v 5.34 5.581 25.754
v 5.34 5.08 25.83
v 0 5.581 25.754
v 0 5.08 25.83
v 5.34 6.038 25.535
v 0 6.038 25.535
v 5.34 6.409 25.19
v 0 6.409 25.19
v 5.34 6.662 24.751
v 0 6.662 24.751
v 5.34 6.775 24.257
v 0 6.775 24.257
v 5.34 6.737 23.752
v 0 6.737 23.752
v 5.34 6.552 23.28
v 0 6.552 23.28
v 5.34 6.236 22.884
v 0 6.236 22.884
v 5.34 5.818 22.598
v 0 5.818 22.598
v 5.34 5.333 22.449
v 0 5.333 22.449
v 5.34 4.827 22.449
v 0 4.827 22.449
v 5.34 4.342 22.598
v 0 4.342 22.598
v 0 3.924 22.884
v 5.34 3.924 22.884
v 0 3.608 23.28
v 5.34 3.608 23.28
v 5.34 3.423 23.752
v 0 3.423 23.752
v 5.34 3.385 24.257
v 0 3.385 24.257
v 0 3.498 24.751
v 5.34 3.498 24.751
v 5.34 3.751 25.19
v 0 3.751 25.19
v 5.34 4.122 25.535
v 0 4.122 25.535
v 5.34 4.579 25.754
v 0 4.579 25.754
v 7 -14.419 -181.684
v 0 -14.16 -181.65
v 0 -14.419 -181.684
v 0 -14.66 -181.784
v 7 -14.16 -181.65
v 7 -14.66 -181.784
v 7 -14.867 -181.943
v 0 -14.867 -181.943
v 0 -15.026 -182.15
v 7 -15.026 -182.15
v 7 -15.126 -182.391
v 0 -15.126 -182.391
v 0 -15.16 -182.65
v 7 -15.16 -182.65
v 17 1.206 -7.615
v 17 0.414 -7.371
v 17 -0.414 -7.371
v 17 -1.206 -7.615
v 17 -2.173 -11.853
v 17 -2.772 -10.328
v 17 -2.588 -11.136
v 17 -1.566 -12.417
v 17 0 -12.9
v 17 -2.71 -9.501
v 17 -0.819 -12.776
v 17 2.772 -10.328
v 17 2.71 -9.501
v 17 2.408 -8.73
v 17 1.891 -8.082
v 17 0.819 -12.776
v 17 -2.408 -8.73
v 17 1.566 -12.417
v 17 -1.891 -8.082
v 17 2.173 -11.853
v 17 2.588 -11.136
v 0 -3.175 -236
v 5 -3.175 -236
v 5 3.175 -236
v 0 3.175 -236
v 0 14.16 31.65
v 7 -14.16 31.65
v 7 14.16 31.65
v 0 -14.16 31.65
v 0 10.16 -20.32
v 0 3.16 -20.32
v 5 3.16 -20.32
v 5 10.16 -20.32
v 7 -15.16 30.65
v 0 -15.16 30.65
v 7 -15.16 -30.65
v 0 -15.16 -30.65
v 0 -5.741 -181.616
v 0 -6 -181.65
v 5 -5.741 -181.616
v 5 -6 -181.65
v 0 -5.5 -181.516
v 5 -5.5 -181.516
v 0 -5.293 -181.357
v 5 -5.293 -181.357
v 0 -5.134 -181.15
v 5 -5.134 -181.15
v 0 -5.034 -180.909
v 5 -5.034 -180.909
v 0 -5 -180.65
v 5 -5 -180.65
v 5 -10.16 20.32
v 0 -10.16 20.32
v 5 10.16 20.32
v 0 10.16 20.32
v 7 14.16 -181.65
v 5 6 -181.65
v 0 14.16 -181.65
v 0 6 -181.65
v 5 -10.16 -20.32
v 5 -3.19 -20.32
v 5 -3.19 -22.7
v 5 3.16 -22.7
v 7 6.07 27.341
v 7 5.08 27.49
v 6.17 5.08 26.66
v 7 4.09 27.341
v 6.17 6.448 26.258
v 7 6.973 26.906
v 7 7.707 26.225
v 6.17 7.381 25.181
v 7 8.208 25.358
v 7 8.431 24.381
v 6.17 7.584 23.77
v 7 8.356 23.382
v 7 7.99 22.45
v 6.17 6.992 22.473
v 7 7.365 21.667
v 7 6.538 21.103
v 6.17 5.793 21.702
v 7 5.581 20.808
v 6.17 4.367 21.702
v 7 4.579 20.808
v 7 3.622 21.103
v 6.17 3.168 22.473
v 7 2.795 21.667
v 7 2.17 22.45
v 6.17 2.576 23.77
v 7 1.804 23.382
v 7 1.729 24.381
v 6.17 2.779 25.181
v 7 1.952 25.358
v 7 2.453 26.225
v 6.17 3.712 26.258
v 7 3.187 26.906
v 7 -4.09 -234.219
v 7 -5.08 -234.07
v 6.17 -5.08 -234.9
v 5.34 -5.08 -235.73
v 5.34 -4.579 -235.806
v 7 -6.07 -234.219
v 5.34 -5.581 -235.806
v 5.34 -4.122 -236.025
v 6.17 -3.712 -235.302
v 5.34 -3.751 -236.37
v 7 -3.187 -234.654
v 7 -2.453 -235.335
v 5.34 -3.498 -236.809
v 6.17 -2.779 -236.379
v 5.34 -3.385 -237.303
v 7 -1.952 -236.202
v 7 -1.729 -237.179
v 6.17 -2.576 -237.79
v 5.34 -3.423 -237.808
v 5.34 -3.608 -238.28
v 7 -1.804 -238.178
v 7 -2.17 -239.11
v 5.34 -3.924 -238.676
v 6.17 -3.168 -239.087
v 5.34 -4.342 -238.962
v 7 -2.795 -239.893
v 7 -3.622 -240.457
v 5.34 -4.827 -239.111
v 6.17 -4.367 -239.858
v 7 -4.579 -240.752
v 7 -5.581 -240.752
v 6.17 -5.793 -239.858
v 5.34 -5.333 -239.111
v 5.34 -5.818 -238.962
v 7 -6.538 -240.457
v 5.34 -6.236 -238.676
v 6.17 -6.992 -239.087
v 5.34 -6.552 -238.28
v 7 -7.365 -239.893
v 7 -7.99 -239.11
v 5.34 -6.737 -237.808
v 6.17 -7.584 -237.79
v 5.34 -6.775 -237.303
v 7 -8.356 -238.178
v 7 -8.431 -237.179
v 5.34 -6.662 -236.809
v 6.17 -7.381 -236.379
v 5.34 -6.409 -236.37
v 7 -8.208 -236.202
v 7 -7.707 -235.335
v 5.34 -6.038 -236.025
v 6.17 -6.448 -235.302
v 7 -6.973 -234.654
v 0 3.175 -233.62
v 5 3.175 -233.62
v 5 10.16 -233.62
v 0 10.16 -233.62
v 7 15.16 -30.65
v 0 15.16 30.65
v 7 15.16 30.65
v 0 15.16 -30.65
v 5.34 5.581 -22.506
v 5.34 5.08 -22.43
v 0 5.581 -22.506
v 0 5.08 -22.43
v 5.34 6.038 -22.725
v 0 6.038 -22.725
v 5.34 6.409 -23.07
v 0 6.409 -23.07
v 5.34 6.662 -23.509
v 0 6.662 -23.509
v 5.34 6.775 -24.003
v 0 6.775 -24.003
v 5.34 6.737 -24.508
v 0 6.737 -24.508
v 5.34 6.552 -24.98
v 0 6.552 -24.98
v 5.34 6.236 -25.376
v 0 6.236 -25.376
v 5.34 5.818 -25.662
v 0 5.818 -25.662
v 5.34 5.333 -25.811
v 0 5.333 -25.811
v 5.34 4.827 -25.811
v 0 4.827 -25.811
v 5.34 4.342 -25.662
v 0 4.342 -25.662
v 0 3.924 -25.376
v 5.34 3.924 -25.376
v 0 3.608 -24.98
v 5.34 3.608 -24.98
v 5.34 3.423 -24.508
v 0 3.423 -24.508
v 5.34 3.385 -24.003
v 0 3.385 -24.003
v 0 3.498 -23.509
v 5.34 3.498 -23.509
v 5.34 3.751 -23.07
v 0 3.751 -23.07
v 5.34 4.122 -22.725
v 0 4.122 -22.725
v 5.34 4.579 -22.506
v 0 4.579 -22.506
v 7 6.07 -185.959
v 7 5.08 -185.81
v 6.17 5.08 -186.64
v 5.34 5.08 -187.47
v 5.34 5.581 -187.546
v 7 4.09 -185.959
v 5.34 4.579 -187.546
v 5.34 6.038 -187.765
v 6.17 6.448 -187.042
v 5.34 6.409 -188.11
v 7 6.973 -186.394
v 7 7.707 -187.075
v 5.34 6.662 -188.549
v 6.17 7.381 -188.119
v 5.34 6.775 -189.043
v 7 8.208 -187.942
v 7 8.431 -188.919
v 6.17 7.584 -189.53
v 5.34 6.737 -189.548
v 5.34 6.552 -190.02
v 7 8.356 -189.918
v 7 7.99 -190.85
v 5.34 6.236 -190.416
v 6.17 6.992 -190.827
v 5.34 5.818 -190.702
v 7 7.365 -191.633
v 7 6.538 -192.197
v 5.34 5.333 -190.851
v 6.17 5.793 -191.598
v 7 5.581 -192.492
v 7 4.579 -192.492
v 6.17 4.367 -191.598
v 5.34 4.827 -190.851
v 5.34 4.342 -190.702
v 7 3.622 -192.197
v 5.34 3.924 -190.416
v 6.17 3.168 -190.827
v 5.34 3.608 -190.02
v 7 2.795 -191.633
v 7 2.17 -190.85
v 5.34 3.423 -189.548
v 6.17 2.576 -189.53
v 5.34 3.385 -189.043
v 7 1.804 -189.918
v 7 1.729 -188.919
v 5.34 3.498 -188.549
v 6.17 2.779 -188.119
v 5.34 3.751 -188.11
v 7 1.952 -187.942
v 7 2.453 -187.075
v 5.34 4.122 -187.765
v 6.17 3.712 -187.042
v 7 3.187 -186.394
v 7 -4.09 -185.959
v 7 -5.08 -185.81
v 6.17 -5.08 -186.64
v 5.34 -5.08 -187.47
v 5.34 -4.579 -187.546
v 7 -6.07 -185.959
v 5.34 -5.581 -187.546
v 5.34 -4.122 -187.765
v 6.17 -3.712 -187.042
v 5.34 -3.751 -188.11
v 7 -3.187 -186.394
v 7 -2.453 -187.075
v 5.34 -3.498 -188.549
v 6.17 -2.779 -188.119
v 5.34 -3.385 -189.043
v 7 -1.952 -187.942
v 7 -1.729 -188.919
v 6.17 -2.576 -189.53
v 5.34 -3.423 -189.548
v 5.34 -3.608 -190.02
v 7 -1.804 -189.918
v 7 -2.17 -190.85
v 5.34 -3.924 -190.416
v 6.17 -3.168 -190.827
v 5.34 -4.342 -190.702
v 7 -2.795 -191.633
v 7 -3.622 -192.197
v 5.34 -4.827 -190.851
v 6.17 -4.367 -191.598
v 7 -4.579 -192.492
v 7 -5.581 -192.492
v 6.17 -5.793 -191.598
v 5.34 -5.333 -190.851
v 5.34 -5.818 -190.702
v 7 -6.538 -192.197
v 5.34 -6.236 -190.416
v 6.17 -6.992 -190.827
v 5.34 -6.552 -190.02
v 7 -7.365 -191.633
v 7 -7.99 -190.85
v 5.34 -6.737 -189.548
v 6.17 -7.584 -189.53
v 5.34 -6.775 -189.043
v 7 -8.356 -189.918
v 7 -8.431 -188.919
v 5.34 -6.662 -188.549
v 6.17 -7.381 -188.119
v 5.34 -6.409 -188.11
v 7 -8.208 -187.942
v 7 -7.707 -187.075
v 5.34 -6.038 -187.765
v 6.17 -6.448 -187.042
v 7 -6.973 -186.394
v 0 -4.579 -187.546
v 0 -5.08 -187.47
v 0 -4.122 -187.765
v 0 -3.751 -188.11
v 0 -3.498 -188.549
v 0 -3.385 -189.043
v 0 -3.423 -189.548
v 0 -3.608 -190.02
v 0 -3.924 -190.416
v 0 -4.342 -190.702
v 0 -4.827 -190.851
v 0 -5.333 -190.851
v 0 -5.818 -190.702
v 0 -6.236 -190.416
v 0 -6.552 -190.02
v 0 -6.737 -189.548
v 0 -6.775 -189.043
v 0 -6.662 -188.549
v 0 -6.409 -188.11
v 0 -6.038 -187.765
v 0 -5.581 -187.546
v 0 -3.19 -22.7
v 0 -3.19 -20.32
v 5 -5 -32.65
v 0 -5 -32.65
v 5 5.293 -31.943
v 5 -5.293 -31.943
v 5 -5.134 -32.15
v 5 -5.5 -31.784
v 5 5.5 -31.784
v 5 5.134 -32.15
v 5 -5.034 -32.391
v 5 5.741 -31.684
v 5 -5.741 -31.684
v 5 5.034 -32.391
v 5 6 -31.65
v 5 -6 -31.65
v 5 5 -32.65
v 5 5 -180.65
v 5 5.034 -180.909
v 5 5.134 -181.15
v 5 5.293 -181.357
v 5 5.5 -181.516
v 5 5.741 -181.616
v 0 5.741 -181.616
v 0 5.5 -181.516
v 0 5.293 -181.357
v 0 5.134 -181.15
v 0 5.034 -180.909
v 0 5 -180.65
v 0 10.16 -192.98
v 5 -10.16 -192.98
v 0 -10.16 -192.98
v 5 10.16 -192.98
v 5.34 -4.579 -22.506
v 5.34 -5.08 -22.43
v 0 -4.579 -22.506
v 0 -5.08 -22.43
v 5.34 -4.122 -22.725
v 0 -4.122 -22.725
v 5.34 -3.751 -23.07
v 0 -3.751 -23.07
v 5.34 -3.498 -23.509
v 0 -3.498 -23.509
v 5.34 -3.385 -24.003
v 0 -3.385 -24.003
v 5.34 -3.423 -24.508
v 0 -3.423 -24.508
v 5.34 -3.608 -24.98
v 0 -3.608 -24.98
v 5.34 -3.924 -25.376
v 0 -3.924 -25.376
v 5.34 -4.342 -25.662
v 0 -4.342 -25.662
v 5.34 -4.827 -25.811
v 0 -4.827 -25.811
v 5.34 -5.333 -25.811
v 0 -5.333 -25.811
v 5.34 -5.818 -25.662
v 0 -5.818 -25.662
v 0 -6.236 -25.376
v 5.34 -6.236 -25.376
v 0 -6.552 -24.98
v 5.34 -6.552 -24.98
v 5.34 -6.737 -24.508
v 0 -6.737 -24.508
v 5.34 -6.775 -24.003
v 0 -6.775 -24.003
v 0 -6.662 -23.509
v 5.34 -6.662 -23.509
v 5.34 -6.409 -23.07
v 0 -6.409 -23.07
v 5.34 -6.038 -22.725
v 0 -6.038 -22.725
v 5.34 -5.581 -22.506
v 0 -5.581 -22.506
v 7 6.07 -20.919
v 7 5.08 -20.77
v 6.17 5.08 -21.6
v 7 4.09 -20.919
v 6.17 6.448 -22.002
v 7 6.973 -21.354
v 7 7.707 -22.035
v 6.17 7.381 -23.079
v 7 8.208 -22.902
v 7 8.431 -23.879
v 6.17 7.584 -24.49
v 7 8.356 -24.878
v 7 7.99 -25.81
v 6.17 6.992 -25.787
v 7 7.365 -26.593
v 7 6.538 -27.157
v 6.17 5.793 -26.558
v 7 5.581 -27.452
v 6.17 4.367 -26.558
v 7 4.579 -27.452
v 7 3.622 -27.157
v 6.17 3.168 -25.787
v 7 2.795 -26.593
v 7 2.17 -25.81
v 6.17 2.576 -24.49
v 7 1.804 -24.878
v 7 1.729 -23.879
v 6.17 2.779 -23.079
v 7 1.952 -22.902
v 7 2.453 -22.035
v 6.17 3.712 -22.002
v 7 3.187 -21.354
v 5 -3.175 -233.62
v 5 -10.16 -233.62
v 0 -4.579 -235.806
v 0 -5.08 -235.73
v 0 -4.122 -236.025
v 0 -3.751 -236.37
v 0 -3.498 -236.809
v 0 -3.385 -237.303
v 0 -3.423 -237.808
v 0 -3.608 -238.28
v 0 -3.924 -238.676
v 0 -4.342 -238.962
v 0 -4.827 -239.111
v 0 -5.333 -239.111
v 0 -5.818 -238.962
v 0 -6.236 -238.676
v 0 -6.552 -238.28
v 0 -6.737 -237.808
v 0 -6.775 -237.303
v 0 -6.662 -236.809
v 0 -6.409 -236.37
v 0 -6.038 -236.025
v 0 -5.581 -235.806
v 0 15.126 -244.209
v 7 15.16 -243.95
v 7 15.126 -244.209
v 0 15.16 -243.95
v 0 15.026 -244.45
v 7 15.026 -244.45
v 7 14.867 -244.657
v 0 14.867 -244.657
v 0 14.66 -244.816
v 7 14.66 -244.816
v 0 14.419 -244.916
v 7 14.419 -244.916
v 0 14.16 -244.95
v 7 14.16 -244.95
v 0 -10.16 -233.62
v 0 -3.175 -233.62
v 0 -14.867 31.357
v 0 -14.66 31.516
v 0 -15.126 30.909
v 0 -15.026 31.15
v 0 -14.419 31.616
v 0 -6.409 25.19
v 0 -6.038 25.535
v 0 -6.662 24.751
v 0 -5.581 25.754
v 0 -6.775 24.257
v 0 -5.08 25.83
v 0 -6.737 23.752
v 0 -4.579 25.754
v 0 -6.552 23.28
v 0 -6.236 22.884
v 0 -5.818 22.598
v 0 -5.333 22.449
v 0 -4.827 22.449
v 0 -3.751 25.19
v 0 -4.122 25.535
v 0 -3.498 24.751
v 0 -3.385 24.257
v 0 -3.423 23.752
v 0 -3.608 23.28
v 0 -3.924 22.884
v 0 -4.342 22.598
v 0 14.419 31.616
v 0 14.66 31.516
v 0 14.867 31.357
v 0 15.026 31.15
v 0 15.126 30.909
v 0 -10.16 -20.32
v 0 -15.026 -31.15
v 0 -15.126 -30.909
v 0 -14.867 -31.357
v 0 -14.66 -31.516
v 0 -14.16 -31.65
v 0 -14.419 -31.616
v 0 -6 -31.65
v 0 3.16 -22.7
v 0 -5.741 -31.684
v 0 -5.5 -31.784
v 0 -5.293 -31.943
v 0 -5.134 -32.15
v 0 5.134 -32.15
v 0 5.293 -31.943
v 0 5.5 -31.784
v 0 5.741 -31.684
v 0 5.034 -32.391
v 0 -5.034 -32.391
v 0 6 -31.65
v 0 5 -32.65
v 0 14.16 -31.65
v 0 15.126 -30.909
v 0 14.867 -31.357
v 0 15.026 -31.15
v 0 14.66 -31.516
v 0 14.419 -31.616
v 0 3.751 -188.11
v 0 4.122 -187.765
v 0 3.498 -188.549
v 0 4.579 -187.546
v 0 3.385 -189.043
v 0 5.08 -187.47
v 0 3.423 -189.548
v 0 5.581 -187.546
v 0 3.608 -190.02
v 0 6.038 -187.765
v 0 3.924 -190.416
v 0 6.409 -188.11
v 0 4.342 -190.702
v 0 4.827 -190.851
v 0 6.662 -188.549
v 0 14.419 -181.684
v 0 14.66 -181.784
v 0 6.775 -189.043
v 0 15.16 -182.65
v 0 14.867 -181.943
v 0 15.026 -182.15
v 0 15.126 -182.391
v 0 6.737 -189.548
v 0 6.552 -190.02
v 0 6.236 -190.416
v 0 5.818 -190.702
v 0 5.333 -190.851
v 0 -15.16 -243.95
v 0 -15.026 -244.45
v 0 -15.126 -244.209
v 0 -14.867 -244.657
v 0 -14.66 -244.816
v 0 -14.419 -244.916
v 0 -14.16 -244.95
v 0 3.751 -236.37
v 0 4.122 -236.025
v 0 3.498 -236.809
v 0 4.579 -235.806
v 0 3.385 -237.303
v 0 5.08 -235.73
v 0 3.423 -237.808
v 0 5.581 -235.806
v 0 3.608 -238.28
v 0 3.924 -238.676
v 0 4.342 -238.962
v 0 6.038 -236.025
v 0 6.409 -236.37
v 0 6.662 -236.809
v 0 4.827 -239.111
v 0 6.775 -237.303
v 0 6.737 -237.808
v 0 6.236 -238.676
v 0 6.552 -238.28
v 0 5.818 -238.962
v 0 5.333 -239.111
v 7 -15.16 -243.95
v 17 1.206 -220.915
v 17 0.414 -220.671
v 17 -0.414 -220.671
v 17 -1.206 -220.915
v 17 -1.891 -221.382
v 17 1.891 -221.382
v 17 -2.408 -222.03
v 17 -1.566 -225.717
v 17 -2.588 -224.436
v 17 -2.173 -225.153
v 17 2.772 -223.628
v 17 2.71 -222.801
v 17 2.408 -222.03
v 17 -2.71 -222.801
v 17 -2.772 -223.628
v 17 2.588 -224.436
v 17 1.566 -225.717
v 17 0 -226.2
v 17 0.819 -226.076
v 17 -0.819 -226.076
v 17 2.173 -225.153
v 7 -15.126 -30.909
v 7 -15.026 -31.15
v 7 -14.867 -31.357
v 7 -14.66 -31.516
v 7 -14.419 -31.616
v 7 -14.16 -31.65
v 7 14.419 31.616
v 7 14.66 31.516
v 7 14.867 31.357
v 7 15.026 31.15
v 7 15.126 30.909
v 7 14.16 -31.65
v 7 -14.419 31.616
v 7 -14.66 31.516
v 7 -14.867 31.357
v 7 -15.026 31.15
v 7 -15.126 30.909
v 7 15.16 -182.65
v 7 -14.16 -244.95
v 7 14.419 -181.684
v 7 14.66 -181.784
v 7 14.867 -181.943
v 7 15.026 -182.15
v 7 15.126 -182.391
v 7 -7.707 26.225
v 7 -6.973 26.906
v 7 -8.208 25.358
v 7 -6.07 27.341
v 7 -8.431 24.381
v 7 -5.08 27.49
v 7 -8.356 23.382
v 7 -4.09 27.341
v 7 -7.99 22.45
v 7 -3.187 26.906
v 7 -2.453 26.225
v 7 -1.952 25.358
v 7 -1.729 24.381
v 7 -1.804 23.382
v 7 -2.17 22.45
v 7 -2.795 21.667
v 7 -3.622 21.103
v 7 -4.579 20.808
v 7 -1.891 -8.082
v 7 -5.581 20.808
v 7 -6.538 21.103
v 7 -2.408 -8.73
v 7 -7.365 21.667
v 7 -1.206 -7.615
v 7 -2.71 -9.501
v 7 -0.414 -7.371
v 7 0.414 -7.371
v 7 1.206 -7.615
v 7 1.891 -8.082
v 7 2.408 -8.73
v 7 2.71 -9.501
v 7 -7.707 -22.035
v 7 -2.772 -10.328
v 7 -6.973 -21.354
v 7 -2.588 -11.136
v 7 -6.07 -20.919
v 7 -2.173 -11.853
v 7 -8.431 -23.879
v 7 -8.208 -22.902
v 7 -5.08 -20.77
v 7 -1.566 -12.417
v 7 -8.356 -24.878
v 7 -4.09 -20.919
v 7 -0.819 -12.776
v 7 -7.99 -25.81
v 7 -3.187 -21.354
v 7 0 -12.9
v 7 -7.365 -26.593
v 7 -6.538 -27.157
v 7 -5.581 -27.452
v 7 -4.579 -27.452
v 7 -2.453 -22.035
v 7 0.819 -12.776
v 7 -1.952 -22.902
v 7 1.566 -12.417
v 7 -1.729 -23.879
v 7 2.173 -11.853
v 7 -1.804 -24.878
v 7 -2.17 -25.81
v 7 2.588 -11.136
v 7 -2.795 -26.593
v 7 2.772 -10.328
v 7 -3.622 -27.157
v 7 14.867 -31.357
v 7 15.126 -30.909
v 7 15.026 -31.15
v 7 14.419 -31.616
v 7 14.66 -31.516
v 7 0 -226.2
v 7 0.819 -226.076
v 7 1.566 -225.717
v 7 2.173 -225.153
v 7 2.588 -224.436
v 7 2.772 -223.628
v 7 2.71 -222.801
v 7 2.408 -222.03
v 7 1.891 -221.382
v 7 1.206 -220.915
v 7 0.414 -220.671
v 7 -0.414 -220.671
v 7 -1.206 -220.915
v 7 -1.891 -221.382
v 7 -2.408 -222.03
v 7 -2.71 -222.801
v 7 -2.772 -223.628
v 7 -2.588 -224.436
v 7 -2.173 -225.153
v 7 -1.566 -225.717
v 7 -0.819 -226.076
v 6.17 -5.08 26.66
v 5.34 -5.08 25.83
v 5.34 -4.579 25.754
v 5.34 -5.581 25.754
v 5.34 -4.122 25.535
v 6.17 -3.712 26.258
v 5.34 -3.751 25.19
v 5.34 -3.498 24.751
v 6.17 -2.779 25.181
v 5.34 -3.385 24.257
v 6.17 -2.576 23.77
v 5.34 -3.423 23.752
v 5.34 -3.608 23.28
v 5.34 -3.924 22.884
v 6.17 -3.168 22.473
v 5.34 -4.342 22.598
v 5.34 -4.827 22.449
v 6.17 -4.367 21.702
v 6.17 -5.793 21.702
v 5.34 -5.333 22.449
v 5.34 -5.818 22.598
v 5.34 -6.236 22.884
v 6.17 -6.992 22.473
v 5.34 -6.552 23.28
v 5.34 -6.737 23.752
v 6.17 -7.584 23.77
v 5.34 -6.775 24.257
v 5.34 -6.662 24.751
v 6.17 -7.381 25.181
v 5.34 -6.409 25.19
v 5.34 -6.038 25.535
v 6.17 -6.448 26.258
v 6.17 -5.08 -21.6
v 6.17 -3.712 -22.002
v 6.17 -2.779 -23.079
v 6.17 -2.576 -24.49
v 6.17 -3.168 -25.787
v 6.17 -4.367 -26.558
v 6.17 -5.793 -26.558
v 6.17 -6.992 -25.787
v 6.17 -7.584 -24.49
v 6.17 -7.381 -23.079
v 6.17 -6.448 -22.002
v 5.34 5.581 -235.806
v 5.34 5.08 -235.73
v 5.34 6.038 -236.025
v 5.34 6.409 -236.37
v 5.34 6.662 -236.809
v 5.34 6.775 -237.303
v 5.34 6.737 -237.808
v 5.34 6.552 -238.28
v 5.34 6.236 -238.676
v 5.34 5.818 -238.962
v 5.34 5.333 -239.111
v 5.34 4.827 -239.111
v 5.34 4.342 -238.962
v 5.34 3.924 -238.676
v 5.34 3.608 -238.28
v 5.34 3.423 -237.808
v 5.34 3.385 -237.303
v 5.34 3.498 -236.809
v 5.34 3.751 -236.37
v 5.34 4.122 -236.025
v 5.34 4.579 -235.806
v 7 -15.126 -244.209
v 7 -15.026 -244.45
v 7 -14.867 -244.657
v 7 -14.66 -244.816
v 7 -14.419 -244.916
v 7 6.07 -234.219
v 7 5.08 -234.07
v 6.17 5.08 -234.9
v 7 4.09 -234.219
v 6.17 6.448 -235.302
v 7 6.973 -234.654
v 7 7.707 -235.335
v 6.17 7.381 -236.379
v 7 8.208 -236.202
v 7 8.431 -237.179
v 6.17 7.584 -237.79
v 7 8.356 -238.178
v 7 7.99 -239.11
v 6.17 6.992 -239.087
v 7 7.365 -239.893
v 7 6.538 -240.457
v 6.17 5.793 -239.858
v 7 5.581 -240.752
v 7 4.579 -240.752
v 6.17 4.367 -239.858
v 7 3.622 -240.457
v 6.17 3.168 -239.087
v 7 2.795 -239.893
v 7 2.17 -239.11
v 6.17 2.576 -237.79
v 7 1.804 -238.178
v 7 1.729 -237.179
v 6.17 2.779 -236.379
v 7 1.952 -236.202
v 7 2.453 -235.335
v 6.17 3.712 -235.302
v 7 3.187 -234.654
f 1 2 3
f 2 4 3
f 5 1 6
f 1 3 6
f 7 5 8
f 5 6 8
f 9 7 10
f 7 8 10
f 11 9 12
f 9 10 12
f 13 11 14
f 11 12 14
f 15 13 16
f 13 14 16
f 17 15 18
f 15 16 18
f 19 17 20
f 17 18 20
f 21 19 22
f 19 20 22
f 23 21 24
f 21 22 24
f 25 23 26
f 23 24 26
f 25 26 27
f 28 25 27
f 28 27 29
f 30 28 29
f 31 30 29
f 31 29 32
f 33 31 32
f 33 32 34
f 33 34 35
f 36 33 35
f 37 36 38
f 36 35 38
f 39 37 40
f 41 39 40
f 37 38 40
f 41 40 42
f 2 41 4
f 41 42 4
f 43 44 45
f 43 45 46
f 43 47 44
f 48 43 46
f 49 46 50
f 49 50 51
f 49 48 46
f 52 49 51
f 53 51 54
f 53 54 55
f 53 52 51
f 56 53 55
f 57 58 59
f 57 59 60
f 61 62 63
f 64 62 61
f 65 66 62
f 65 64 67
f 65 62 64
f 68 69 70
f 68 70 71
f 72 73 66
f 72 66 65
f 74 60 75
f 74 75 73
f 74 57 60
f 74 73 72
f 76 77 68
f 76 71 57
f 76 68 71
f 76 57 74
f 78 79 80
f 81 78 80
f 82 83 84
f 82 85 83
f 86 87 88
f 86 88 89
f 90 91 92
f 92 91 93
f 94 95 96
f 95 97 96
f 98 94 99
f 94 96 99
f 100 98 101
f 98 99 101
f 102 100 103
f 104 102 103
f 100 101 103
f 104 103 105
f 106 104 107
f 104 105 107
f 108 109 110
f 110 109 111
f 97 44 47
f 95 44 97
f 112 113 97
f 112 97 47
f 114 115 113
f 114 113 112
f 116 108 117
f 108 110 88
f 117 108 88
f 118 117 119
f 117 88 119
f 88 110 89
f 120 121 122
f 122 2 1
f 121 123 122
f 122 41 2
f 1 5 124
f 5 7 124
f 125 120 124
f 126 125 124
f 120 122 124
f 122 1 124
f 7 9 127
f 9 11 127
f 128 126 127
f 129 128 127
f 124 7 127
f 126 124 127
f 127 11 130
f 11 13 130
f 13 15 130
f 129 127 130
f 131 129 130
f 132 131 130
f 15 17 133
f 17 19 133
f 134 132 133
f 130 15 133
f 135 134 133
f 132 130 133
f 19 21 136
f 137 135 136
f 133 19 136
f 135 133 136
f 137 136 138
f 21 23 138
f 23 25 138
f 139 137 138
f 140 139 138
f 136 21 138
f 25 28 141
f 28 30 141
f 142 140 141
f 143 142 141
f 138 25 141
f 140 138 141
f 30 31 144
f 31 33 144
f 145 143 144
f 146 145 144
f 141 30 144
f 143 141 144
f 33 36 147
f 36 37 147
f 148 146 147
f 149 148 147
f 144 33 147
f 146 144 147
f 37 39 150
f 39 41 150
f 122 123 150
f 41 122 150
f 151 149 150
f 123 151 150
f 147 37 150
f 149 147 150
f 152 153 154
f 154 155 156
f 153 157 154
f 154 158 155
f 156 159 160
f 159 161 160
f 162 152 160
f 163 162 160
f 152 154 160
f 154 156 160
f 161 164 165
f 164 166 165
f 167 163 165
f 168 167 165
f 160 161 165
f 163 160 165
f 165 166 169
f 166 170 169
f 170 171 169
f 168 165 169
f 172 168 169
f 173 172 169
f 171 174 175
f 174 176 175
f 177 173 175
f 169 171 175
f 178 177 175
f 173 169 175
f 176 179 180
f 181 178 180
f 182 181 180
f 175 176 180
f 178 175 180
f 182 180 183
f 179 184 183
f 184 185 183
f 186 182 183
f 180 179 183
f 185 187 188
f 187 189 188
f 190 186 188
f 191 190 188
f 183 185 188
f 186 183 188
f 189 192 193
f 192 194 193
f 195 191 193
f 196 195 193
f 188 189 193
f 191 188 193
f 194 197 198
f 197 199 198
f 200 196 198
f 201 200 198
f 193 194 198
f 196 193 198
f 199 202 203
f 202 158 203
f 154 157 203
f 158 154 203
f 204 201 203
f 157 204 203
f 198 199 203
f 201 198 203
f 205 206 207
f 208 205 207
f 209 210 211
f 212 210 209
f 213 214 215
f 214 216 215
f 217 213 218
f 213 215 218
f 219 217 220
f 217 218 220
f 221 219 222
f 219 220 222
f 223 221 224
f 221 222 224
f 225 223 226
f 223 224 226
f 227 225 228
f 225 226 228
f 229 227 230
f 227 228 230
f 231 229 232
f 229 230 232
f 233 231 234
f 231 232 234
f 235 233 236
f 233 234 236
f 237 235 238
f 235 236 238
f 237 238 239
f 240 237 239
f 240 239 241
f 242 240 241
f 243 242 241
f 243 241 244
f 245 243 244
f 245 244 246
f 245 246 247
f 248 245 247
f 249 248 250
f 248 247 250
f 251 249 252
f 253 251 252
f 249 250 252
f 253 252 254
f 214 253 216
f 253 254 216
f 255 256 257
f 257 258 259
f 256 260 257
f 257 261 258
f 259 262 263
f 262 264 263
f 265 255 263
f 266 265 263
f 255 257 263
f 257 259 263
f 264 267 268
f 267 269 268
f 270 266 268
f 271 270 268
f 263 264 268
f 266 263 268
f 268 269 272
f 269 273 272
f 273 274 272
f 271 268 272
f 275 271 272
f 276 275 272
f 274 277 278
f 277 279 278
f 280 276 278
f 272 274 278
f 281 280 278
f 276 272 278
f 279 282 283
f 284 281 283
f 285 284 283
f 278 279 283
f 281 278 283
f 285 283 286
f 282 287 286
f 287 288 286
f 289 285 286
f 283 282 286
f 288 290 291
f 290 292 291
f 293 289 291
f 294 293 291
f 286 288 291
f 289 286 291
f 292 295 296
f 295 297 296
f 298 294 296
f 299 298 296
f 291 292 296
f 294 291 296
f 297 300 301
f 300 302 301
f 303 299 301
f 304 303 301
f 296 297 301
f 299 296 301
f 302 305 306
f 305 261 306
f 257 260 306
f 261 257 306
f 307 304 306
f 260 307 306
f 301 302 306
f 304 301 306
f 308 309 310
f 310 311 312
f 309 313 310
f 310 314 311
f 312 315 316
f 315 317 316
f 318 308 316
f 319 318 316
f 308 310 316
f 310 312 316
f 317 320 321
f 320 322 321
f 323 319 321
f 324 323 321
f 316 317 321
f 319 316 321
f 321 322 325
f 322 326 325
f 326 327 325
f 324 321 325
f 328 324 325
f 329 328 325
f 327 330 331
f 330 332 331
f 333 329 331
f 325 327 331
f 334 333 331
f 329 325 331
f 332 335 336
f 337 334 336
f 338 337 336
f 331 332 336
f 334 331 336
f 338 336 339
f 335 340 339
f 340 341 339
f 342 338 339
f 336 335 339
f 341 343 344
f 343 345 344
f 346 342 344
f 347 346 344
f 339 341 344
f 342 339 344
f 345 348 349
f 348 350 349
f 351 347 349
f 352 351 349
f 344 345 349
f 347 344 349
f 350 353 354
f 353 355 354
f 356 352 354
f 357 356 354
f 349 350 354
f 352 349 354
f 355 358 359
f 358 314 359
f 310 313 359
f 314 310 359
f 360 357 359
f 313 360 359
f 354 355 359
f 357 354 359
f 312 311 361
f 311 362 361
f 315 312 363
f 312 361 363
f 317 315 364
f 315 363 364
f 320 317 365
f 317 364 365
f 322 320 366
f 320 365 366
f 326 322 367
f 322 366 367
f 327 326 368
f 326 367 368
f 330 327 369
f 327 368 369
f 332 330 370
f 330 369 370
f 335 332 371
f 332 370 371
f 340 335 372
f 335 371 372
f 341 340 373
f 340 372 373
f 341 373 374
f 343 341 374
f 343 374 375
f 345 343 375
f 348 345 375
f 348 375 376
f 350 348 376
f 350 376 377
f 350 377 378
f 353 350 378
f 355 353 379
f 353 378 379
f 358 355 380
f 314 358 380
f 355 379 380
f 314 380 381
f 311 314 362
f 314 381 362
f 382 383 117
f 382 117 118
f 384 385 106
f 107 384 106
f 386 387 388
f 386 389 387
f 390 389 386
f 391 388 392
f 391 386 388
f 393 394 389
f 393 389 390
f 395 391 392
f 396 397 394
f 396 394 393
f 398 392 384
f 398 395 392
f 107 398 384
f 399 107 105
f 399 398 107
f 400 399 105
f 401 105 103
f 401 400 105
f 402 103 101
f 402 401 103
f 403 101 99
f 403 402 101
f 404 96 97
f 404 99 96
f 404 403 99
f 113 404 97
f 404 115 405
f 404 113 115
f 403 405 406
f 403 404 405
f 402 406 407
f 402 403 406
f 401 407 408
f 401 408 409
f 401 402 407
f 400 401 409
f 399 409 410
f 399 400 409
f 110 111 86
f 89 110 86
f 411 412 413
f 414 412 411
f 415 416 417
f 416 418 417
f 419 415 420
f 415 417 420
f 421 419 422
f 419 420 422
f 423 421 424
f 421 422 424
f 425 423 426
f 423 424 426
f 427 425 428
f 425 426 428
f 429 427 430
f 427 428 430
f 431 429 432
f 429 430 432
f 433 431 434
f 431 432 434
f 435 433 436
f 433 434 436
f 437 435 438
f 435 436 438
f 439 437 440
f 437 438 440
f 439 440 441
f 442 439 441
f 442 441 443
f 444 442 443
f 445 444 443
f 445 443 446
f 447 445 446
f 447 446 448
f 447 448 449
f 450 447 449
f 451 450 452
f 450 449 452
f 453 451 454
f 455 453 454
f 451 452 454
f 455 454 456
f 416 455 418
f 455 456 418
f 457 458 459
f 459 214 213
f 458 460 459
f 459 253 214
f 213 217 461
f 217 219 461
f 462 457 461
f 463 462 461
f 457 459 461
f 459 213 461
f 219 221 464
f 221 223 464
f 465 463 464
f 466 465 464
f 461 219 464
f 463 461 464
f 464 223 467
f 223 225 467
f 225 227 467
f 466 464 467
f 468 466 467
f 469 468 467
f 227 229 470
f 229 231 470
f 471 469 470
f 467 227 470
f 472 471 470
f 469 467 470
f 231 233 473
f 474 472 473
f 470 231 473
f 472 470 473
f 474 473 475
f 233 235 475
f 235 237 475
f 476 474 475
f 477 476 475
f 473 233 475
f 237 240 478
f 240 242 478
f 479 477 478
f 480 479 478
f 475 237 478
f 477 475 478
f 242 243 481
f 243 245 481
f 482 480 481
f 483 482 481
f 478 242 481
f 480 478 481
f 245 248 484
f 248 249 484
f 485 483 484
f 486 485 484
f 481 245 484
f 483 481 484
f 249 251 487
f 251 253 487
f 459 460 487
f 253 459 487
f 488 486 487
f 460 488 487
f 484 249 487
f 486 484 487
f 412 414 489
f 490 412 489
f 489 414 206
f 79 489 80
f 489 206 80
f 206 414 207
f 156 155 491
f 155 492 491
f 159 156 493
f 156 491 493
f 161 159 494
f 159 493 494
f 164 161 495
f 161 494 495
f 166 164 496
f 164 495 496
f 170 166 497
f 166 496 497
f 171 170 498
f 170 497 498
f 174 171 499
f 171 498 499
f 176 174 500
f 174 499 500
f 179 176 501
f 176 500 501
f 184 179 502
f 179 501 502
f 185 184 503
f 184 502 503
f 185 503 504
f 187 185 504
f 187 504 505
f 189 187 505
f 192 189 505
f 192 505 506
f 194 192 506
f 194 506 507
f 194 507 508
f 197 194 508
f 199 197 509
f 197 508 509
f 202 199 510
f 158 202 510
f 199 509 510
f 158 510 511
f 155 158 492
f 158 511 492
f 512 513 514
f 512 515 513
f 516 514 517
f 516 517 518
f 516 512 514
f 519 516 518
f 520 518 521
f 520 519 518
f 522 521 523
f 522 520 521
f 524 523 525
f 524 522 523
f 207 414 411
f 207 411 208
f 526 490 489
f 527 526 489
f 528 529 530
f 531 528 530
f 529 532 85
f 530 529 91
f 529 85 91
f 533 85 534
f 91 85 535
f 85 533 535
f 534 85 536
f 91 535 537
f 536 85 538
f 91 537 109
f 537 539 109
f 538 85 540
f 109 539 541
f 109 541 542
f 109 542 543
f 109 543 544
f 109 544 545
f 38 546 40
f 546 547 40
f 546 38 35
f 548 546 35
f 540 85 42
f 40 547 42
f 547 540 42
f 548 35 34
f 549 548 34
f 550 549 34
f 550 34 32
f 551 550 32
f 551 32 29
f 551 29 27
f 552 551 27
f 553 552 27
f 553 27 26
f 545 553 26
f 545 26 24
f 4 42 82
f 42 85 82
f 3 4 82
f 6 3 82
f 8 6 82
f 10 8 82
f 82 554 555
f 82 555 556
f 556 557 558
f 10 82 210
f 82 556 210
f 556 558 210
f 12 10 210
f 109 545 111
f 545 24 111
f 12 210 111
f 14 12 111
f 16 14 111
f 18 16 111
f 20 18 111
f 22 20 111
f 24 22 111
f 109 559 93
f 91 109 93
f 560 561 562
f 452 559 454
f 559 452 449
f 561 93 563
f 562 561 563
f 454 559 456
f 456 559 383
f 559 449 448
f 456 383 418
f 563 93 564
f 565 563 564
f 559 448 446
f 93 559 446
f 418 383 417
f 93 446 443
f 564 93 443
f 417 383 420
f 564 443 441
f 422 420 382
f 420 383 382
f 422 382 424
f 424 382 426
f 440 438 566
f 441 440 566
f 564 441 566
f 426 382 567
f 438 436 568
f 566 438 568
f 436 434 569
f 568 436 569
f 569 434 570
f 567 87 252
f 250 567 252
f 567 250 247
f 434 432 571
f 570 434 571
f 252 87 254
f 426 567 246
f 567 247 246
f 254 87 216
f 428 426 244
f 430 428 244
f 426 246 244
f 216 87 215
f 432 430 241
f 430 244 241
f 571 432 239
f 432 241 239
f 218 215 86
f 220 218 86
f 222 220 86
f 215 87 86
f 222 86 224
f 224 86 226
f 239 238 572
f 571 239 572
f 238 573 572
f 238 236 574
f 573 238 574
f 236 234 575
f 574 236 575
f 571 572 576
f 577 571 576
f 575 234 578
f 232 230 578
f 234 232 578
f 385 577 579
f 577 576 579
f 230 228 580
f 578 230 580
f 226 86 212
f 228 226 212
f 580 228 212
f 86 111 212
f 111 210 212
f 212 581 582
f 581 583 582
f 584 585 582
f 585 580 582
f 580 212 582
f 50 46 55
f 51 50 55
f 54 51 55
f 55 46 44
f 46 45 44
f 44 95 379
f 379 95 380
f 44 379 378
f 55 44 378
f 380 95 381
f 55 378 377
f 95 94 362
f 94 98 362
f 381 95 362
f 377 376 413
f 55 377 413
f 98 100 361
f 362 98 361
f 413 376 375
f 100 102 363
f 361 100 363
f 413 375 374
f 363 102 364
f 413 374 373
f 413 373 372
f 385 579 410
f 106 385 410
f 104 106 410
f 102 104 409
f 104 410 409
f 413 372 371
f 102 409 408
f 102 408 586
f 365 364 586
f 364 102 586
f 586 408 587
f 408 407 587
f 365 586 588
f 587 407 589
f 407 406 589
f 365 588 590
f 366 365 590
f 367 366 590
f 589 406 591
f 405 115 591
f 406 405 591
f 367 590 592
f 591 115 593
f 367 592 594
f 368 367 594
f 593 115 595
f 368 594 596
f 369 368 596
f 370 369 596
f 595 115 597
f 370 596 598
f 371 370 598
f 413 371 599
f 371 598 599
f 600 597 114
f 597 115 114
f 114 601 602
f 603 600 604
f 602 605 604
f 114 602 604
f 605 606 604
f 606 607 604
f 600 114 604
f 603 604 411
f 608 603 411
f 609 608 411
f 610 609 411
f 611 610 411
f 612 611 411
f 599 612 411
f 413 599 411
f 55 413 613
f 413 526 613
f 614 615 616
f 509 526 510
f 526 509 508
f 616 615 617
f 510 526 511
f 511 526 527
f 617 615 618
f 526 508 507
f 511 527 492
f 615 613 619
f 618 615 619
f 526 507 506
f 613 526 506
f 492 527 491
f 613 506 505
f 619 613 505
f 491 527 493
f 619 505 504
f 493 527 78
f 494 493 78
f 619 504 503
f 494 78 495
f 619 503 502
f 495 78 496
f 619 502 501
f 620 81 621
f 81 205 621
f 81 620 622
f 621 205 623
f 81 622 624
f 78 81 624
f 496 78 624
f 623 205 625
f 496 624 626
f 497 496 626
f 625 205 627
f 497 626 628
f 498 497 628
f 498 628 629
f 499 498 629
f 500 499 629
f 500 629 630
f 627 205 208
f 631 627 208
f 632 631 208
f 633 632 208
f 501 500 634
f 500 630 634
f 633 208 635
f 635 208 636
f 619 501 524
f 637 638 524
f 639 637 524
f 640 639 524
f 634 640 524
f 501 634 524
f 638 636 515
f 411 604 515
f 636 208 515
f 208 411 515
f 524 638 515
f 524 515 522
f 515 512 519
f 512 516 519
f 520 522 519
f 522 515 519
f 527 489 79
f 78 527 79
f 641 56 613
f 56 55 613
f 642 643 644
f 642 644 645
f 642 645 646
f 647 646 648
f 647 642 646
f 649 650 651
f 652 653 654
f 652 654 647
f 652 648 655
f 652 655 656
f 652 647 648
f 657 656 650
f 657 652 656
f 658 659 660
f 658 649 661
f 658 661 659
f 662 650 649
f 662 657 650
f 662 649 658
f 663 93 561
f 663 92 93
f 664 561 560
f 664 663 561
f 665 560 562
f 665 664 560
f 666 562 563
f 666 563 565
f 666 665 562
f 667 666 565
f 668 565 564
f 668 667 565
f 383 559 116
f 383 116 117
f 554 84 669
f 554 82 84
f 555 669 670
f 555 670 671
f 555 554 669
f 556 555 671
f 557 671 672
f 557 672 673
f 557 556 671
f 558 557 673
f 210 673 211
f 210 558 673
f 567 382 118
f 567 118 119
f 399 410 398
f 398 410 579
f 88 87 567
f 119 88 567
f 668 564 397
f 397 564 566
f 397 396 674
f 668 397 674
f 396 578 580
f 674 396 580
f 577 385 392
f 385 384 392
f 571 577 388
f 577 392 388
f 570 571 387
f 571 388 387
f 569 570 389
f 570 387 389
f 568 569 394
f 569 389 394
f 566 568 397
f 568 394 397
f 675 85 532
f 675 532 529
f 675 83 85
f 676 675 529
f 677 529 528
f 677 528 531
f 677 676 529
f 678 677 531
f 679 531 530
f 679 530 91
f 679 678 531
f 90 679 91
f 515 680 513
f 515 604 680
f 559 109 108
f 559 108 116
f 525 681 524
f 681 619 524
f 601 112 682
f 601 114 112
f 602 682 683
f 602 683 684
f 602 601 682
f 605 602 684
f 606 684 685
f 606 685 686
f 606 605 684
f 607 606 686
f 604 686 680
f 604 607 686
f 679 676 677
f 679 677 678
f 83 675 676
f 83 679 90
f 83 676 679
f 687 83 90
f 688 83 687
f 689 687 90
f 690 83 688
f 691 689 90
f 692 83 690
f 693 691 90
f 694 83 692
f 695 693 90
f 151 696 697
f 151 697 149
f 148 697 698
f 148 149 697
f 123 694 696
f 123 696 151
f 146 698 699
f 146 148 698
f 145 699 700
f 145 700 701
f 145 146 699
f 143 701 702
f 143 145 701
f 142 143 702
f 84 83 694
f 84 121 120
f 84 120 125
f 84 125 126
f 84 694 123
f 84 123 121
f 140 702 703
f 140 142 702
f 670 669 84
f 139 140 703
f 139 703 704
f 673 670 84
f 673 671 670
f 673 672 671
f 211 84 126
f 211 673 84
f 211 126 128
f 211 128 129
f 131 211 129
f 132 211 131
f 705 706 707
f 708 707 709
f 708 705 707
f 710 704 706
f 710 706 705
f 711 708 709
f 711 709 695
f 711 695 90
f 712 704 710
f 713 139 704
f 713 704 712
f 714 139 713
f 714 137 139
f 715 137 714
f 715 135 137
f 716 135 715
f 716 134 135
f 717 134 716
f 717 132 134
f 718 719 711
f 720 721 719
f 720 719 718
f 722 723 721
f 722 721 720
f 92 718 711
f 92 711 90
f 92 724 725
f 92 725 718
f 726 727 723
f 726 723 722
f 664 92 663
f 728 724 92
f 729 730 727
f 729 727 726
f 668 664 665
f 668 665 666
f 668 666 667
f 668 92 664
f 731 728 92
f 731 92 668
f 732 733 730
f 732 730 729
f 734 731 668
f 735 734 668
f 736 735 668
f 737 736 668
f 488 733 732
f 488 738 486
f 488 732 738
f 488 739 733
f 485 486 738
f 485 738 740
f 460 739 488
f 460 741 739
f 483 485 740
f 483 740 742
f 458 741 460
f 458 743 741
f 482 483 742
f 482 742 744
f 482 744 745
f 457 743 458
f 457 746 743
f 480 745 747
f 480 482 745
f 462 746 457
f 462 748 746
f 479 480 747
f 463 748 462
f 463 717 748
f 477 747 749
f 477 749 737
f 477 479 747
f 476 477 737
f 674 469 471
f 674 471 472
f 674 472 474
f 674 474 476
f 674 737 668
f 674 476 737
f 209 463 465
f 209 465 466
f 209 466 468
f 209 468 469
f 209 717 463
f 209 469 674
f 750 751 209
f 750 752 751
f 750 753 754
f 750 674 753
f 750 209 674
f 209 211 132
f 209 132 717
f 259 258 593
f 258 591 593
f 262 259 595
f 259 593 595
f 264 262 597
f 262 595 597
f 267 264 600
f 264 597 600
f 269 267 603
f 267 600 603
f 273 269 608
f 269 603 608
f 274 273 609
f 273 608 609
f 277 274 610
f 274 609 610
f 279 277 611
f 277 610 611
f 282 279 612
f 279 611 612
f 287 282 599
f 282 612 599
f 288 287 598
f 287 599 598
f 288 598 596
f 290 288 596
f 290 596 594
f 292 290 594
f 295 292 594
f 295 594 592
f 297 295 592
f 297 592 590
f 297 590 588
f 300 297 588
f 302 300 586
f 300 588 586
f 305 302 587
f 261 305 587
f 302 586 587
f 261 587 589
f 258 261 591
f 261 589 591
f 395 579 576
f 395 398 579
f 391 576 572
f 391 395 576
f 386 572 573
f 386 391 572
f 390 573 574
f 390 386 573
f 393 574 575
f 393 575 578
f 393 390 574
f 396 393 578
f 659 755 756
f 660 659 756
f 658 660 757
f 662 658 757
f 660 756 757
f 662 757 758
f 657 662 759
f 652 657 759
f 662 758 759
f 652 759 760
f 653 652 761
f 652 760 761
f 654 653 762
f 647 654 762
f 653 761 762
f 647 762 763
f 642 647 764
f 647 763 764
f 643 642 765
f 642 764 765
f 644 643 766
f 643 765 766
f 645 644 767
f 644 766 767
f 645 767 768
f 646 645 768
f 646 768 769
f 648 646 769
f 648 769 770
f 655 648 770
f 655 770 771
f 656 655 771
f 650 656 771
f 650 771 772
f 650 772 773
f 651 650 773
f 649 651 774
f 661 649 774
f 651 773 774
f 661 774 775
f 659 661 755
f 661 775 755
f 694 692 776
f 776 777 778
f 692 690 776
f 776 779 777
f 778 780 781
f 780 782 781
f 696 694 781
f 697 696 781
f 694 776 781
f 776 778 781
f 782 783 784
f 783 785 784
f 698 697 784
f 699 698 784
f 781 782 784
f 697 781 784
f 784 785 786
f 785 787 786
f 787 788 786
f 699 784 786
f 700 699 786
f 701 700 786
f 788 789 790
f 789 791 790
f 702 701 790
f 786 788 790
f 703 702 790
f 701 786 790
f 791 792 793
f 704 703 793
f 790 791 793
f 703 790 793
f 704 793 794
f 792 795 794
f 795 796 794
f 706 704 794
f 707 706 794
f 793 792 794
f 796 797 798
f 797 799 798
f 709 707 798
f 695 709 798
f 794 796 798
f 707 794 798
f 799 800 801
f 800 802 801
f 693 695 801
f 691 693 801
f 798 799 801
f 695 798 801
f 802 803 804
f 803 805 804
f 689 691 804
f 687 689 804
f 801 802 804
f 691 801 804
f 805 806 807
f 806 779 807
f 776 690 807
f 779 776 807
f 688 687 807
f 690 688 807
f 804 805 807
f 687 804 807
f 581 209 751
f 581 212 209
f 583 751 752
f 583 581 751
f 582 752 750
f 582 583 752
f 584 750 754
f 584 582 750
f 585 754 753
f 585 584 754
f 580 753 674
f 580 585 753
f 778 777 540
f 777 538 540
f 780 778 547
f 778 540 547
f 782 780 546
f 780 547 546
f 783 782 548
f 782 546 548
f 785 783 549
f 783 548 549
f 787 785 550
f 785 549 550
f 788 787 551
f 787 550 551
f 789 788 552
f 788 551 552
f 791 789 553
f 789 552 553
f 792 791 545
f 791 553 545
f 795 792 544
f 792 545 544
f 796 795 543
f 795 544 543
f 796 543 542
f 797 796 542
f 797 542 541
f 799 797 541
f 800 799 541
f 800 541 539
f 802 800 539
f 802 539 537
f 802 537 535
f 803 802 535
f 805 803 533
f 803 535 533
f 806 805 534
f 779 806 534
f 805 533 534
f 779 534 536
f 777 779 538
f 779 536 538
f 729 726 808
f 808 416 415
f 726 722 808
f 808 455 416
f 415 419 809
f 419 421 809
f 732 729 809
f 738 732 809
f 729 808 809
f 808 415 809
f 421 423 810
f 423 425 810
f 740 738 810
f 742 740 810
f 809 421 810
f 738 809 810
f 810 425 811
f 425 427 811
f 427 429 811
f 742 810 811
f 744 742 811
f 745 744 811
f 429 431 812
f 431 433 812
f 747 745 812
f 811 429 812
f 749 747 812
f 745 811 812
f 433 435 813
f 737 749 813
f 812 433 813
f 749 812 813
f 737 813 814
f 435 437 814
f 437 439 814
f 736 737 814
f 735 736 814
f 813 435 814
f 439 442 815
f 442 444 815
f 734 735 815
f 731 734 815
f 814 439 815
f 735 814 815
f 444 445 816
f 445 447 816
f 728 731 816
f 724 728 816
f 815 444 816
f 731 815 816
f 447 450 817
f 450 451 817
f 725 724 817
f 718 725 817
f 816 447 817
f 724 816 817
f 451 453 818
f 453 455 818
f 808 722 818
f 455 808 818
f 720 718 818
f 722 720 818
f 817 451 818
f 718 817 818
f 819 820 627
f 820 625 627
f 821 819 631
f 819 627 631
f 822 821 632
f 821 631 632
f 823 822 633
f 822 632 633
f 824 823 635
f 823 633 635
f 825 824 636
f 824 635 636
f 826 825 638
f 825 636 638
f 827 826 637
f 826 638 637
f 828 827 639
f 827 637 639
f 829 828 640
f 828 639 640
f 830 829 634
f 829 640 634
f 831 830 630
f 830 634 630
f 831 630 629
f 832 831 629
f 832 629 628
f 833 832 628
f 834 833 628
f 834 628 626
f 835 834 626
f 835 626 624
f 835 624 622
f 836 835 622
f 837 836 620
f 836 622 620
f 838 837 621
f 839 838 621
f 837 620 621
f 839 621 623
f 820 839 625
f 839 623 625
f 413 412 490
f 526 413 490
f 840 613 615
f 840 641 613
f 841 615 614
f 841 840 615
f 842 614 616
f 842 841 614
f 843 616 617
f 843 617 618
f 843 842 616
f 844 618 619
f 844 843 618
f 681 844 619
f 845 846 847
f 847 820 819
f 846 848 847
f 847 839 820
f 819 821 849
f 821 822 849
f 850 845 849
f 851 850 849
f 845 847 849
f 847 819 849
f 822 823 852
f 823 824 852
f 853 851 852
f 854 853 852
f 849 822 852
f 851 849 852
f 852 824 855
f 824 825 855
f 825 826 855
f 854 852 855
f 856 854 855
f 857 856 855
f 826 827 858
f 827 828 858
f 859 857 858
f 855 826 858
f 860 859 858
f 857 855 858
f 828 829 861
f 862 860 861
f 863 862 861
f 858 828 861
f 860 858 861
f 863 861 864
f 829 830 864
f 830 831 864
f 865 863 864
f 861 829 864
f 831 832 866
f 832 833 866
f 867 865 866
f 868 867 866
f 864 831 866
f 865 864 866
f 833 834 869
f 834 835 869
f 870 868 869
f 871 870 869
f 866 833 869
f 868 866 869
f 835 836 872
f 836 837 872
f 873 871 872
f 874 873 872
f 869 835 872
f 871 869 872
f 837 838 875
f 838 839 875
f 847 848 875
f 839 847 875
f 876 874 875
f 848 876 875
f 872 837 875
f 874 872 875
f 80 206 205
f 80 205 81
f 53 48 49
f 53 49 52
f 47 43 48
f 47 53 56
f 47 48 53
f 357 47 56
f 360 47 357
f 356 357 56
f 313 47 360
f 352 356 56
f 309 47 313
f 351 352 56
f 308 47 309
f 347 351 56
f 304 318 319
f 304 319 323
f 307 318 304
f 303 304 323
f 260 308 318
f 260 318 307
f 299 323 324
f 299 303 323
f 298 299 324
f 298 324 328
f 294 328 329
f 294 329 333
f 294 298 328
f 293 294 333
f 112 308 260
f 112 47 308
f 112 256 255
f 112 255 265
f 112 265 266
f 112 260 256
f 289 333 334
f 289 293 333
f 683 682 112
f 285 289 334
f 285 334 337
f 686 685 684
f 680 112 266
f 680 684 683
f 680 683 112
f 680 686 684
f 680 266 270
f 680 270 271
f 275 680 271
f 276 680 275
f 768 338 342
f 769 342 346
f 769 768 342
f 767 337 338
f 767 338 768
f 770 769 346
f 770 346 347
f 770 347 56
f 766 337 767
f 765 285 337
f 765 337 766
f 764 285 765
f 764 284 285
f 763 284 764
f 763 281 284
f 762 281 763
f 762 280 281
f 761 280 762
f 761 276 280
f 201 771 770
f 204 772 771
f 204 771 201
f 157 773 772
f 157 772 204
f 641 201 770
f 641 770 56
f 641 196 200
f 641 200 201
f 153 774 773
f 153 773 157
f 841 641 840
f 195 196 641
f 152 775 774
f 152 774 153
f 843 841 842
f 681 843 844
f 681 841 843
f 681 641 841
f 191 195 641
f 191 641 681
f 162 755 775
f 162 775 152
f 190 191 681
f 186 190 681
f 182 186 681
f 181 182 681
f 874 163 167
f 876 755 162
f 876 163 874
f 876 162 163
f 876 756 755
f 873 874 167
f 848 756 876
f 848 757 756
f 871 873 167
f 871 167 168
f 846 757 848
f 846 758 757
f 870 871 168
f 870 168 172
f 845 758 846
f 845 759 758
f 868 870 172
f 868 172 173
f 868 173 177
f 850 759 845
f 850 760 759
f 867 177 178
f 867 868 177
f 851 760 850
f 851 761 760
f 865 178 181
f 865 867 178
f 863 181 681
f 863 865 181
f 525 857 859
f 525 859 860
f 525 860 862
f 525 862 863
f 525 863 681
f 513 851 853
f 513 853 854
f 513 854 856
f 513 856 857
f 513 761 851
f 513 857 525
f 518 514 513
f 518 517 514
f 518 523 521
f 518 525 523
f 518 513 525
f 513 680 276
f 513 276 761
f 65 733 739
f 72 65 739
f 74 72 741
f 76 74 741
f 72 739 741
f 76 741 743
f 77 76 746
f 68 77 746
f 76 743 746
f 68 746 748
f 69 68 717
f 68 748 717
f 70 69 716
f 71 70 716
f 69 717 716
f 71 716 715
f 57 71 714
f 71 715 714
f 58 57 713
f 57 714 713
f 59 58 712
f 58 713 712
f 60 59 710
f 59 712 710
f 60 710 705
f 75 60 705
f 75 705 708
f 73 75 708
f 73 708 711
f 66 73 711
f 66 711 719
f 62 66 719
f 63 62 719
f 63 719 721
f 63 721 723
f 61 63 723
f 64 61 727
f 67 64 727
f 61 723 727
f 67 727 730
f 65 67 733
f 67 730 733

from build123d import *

# Parameters (mm, degrees)
BOSS_EXTRUDE1_DEPTH           = 5
CUT_EXTRUDE3_DEPTH            = 246.469607284
CUT_EXTRUDE5_DEPTH            = 246.469607284
SKETCH7_W                     = 63.3
SKETCH7_H                     = 30.32
BOSS_EXTRUDE2_DEPTH           = 2
SKETCH10_R                    = 2.78
BOSS_EXTRUDE3_DEPTH           = 10
SKETCH11_W                    = 63.3
SKETCH11_H                    = 30.32
BOSS_EXTRUDE4_DEPTH           = 2
SKETCH12_R                    = 2.78
BOSS_EXTRUDE5_DEPTH           = 10
FILLET1_R                     = 1
CSK_FOR_M3_SFHCS1_D           = 3.4
CSK_FOR_M3_SFHCS1_CSINK_D     = 6.72
CSK_FOR_M3_SFHCS1_CSINK_ANGLE = 90


with BuildPart() as part:
    # Sketch2 → Boss-Extrude1 (new body)
    with BuildSketch(Plane(origin=(0, 0, 0), x_dir=(0, 0, -1), z_dir=(1, 0, 0))):
        Polygon((31.65, -15.16), (31.65, -5), (181.65, -5), (181.65, -15.16), (244.95, -15.16), (244.95, 15.16), (181.65, 15.16), (181.65, 5), (31.65, 5), (31.65, 15.16), (-31.65, 15.16), (-31.65, -15.16), align=None)
    extrude(amount=BOSS_EXTRUDE1_DEPTH)

    # Sketch1 → Cut-Extrude3 (cut, through all)
    with BuildSketch(Plane(origin=(0, 0, 0), x_dir=(0, 0, -1), z_dir=(1, 0, 0))):
        Polygon((20.32, 10.16), (-20.32, 10.16), (-20.32, -10.16), (20.32, -10.16), (20.32, -3.19), (22.7, -3.19), (22.7, 3.16), (20.32, 3.16), align=None)
    extrude(amount=CUT_EXTRUDE3_DEPTH, mode=Mode.SUBTRACT)

    # Sketch3 → Cut-Extrude5 (cut, through all)
    with BuildSketch(Plane(origin=(5, 0, 0), x_dir=(0, 0, -1), z_dir=(1, 0, 0))):
        Polygon((192.98, 10.16), (192.98, -10.16), (233.62, -10.16), (233.62, -3.175), (236, -3.175), (236, 3.175), (233.62, 3.175), (233.62, 10.16), align=None)
    extrude(amount=-CUT_EXTRUDE5_DEPTH, mode=Mode.SUBTRACT)

    # Sketch7 → Boss-Extrude2 (add)
    with BuildSketch(Plane(origin=(5, 0, 0), x_dir=(0, 0, -1), z_dir=(1, 0, 0))):
        Rectangle(SKETCH7_W, SKETCH7_H)
    extrude(amount=BOSS_EXTRUDE2_DEPTH)

    # Sketch10 → Boss-Extrude3 (add)
    with BuildSketch(Plane(origin=(7, 0, 0), x_dir=(0, 0, -1), z_dir=(1, 0, 0))):
        with Locations((10.12, 0)):
            Circle(SKETCH10_R)
    extrude(amount=BOSS_EXTRUDE3_DEPTH)

    # Sketch11 → Boss-Extrude4 (add)
    with BuildSketch(Plane(origin=(5, 0, 0), x_dir=(0, 0, -1), z_dir=(1, 0, 0))):
        with Locations((213.3, 0)):
            Rectangle(SKETCH11_W, SKETCH11_H)
    extrude(amount=BOSS_EXTRUDE4_DEPTH)

    # Sketch12 → Boss-Extrude5 (add)
    with BuildSketch(Plane(origin=(7, 0, 0), x_dir=(0, 0, -1), z_dir=(1, 0, 0))):
        with Locations((223.42, 0)):
            Circle(SKETCH12_R)
    extrude(amount=BOSS_EXTRUDE5_DEPTH)

    # Fillet1
    fillet1_edges = [part.edges().sort_by_distance(p)[0] for p in [
        (3.5, -15.16, -244.95),
        (3.5, 15.16, -244.95),
        (3.5, 15.16, -181.65),
        (2.5, 5, -181.65),
        (3.5, -15.16, -181.65),
        (2.5, -5, -181.65),
        (2.5, -5, -31.65),
        (2.5, 5, -31.65),
        (3.5, 15.16, -31.65),
        (3.5, -15.16, -31.65),
        (3.5, -15.16, 31.65),
        (3.5, 15.16, 31.65),
    ]]
    fillet(fillet1_edges, radius=FILLET1_R)

    # CSK for M3 SFHCS1 (through all)
    with Locations(Plane(origin=(7, 0, 0), x_dir=(0, 0, -1), z_dir=(1, 0, 0))):
        with Locations((-24.13, 5.08), (-24.13, -5.08), (24.13, -5.08), (24.13, 5.08), (189.17, 5.08), (189.17, -5.08), (237.43, 5.08), (237.43, -5.08)):
            CounterSinkHole(CSK_FOR_M3_SFHCS1_D / 2, CSK_FOR_M3_SFHCS1_CSINK_D / 2, counter_sink_angle=CSK_FOR_M3_SFHCS1_CSINK_ANGLE)


solid = part.part
